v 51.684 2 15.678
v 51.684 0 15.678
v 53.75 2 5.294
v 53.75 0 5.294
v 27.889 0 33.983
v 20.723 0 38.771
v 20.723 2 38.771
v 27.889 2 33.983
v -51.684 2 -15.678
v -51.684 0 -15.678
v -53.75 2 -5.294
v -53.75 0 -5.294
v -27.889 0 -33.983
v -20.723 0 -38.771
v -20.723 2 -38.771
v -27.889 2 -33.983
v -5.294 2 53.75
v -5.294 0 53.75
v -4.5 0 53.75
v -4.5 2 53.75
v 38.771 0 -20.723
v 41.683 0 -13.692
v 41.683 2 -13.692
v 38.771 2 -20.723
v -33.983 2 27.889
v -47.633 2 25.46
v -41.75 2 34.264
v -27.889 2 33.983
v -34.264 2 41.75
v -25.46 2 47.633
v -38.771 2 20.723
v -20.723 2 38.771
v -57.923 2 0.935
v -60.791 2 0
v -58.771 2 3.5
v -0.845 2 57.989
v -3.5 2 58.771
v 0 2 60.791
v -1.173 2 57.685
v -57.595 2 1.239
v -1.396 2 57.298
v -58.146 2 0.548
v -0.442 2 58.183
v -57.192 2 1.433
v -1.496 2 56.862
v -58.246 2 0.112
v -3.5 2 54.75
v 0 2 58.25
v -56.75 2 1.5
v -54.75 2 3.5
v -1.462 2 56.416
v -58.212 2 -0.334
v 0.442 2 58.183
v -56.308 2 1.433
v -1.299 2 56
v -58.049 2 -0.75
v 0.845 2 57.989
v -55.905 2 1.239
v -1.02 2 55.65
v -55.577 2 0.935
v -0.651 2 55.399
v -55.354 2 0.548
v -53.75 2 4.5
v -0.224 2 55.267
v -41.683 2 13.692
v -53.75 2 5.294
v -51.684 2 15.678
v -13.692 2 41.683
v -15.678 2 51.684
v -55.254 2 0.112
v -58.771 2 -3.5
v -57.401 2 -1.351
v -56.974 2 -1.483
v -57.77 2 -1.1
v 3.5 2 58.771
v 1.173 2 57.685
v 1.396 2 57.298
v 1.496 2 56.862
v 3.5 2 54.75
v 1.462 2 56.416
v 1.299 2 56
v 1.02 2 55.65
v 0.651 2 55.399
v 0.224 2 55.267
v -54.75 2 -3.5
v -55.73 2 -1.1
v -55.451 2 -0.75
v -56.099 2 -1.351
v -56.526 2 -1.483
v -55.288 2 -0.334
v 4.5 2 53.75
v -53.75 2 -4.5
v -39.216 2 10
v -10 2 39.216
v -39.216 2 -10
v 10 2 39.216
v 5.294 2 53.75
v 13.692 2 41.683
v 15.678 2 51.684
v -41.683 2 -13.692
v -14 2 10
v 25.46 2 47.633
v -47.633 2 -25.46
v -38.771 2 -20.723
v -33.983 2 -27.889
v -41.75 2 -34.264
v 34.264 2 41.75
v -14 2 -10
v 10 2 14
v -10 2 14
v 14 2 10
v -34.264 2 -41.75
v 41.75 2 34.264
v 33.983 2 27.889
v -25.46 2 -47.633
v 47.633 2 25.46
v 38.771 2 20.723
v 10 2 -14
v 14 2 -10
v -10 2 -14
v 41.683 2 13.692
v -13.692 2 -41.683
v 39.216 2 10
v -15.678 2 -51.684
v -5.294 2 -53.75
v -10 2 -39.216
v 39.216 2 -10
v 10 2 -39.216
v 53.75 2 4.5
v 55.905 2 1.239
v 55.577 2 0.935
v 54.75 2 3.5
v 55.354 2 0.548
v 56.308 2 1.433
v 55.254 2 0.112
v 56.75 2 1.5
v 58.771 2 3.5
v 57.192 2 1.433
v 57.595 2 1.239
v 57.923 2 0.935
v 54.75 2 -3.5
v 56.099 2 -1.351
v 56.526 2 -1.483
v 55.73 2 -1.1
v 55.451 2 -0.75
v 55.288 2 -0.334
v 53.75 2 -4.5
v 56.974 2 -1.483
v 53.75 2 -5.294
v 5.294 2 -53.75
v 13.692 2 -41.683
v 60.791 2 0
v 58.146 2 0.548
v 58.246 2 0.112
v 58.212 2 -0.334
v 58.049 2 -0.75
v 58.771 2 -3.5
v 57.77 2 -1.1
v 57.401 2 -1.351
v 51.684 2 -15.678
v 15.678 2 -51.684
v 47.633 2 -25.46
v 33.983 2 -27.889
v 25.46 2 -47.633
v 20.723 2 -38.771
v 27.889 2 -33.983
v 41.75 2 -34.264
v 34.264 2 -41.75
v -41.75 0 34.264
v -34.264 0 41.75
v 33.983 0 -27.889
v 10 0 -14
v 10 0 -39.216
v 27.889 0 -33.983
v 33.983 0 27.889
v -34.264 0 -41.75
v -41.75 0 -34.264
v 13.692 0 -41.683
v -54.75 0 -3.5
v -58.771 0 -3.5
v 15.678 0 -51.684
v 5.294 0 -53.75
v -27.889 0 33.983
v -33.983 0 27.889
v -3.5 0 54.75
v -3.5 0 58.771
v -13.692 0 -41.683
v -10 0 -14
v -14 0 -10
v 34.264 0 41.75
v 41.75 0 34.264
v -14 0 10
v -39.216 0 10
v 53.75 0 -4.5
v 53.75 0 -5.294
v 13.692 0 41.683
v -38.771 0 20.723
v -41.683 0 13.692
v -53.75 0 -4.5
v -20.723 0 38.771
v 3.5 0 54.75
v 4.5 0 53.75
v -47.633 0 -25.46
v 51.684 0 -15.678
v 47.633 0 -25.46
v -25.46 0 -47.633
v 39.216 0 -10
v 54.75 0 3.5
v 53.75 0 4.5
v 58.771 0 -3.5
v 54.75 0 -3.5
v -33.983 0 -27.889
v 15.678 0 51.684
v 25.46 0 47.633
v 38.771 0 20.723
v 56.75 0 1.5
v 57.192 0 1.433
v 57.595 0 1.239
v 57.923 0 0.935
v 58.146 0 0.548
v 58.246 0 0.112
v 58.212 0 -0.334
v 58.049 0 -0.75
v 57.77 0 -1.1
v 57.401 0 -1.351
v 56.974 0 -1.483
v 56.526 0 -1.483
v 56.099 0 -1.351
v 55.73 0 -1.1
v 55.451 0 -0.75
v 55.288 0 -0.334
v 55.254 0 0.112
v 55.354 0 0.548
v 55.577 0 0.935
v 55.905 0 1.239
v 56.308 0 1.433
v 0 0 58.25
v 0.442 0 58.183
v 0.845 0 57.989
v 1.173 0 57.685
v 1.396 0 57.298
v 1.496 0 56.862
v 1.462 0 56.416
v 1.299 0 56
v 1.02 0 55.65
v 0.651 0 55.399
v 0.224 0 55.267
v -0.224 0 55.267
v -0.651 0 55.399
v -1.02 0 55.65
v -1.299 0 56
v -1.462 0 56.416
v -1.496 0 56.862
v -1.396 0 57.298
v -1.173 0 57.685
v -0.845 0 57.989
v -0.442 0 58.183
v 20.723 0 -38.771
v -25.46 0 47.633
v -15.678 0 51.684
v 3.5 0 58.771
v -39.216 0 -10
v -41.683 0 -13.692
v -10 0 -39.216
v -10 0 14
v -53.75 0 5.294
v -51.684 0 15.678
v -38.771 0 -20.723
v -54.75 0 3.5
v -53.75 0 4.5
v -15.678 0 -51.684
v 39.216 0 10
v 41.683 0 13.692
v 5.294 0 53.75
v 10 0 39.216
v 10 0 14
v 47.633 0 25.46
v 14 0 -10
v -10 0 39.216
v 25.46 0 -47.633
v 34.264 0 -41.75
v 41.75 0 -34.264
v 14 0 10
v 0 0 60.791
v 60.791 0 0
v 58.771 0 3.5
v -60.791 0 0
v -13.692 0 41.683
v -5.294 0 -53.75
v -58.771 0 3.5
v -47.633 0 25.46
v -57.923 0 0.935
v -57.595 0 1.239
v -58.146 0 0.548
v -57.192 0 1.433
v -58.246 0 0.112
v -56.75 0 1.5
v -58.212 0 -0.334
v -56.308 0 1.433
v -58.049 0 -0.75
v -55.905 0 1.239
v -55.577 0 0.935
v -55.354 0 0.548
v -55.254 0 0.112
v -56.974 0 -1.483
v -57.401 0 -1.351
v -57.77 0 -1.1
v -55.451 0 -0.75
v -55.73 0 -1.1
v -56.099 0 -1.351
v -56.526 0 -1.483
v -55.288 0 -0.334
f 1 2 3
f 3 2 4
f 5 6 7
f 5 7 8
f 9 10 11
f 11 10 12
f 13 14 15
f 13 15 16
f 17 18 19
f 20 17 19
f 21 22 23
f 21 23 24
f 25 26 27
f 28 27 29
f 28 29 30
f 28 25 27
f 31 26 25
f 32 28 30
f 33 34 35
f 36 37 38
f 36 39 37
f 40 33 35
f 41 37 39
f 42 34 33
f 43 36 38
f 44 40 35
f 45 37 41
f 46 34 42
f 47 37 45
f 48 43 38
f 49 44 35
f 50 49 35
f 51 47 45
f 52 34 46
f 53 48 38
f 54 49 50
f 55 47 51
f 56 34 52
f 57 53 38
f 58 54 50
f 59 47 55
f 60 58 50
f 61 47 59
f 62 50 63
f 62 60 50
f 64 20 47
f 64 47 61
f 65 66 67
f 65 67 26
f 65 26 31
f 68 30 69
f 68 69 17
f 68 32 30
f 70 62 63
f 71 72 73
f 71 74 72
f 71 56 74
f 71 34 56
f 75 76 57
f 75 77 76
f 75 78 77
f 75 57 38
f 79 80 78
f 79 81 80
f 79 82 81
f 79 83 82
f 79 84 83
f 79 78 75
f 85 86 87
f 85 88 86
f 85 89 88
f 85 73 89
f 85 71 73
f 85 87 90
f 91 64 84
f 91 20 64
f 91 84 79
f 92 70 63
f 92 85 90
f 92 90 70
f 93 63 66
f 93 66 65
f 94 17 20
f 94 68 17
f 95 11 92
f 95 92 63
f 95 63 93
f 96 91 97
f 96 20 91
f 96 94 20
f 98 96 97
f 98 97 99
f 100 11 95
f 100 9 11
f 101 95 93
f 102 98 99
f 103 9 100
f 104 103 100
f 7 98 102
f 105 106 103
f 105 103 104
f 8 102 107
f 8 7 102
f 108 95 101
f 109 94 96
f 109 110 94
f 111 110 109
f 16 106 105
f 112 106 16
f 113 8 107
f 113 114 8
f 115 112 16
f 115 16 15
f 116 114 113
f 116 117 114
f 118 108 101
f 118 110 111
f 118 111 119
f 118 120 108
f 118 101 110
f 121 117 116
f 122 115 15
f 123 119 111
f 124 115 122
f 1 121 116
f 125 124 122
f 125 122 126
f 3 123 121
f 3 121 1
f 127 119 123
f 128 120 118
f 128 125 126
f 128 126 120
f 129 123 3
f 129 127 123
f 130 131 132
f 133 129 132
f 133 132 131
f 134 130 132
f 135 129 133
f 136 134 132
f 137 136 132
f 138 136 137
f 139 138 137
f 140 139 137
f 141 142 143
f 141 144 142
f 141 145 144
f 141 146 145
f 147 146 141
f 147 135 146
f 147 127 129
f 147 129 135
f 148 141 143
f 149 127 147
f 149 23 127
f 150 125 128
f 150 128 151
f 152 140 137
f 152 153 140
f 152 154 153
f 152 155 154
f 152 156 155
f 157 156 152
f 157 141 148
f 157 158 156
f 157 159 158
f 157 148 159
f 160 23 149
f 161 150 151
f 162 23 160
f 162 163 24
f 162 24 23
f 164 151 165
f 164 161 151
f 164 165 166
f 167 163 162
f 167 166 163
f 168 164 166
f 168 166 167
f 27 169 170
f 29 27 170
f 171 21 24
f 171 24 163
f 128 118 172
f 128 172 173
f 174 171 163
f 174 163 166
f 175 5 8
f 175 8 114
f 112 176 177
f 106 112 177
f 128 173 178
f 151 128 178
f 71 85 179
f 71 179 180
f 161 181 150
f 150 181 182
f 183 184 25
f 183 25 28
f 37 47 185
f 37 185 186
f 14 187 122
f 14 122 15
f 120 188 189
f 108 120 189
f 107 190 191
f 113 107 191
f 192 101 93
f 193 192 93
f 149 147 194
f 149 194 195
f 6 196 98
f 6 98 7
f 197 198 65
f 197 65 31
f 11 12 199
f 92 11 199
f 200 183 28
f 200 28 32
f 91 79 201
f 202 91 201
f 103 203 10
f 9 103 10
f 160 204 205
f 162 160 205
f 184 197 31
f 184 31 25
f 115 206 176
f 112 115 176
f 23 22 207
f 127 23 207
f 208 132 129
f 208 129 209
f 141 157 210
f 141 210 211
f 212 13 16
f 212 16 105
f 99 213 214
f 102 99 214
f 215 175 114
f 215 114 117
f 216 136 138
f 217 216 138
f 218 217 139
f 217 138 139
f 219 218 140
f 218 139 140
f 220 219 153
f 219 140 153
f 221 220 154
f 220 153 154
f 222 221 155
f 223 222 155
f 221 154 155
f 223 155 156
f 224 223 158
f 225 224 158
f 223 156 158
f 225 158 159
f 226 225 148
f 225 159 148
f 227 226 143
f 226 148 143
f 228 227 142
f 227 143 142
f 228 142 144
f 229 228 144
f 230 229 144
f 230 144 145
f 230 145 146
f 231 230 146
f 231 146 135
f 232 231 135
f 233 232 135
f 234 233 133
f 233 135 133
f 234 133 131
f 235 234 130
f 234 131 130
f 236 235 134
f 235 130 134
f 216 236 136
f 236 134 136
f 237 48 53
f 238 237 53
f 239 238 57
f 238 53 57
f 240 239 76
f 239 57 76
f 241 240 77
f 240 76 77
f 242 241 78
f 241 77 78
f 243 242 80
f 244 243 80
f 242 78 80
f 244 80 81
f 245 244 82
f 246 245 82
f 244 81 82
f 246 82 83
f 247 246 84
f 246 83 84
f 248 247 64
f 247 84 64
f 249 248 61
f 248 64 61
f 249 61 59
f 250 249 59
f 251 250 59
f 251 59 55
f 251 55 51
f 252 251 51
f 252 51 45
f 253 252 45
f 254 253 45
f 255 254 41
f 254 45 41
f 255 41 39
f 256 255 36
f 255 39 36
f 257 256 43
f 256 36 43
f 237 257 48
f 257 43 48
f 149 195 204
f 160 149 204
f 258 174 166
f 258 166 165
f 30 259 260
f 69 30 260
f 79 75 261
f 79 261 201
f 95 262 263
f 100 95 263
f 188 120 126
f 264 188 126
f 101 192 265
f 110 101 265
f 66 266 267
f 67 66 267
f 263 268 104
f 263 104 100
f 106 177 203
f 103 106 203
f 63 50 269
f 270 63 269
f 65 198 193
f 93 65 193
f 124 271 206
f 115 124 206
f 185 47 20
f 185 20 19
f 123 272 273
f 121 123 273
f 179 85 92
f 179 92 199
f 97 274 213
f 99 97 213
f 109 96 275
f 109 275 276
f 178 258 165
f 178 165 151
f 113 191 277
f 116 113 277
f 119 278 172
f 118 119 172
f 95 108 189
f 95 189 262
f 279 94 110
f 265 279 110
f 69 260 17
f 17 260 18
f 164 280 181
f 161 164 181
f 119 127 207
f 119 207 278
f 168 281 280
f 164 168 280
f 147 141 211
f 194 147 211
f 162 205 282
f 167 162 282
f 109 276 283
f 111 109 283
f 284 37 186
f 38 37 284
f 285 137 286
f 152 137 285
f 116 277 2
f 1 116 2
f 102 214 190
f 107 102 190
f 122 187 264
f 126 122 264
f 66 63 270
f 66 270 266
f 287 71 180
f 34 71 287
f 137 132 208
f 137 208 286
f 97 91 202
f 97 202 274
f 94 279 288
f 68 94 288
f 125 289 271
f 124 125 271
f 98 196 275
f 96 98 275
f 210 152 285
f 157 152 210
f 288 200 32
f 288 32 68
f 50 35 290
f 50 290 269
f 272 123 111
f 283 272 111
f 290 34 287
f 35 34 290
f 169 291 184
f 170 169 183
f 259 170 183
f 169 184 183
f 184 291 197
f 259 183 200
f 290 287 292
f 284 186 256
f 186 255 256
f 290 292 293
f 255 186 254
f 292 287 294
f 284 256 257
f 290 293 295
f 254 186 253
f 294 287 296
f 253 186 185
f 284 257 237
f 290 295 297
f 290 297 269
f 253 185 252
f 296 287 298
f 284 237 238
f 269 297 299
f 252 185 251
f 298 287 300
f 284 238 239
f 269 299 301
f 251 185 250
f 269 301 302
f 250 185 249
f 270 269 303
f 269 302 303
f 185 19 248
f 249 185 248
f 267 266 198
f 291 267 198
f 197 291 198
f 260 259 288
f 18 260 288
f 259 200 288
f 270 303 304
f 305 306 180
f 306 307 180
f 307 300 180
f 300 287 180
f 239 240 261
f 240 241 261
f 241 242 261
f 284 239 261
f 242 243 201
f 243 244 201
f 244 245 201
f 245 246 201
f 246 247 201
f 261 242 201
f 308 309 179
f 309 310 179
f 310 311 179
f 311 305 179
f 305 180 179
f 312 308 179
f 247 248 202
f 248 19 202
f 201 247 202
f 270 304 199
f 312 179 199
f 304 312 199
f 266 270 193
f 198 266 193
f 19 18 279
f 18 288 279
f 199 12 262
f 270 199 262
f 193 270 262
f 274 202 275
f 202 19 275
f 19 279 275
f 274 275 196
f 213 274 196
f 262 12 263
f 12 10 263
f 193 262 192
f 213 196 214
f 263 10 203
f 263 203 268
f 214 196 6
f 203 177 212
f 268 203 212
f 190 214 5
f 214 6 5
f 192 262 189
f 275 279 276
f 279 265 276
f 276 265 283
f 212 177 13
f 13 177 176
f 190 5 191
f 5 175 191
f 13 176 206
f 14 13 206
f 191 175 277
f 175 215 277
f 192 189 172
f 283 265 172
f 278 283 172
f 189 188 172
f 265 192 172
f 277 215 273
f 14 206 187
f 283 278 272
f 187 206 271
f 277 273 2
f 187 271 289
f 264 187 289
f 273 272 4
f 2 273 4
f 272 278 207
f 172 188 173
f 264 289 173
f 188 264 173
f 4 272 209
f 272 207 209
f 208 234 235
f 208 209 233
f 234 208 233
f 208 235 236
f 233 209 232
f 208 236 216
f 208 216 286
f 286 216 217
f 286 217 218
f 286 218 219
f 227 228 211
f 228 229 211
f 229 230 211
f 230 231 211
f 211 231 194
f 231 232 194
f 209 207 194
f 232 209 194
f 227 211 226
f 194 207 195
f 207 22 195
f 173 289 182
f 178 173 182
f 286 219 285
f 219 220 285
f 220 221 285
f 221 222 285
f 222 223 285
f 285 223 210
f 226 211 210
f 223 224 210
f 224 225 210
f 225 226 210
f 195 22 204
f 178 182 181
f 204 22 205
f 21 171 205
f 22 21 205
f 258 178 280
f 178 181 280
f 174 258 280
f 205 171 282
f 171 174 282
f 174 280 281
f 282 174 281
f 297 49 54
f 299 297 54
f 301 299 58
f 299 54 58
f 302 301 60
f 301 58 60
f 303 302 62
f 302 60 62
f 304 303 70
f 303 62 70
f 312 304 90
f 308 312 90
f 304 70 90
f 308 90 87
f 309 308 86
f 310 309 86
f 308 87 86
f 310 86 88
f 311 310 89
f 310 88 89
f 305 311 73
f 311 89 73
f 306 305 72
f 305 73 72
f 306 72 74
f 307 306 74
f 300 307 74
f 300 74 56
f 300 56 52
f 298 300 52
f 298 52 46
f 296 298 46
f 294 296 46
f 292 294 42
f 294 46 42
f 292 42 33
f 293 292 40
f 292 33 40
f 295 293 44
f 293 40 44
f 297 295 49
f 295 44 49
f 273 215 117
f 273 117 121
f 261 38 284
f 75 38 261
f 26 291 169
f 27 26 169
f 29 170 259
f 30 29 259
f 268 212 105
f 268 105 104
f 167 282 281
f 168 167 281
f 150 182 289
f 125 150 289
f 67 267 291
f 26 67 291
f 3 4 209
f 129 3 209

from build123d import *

# Parameters (mm, degrees)
BOSS_EXTRUDE1_DEPTH = 2
SKETCH3_W           = 20
SKETCH3_H           = 87.5
BOSS_EXTRUDE4_DEPTH = 2
CIRPATTERN1_COUNT   = 2
CIRPATTERN1_ANGLE   = 90
CHAMFER1_DEPTH      = 2
SKETCH5_R           = 1.5
BOSS_EXTRUDE6_DEPTH = 2
CHAMFER3_SIZE       = 1


with BuildPart() as part:
    # Sketch1 → Boss-Extrude1 (new body)
    with BuildSketch(Plane(origin=(0, 0, 0), x_dir=(1, 0, 0), z_dir=(0, 1, 0))):
        Polygon((53.75, 5.29391293), (51.684417643, 15.678296686), (47.632632102, 25.460172293), (41.750351221, 34.263627757), (34.263627757, 41.750351221), (25.460172293, 47.632632102), (15.678296686, 51.684417643), (5.29391293, 53.75), (-5.29391293, 53.75), (-15.678296686, 51.684417643), (-25.460172293, 47.632632102), (-34.263627757, 41.750351221), (-41.750351221, 34.263627757), (-47.632632102, 25.460172293), (-51.684417643, 15.678296686), (-53.75, 5.29391293), (-53.75, -5.29391293), (-51.684417643, -15.678296686), (-47.632632102, -25.460172293), (-41.750351221, -34.263627757), (-34.263627757, -41.750351221), (-25.460172293, -47.632632102), (-15.678296686, -51.684417643), (-5.29391293, -53.75), (5.29391293, -53.75), (15.678296686, -51.684417643), (25.460172293, -47.632632102), (34.263627757, -41.750351221), (41.750351221, -34.263627757), (47.632632102, -25.460172293), (51.684417643, -15.678296686), (53.75, -5.29391293), align=None)
        Polygon((43.75, 4.308998897), (42.068712035, 12.76140428), (38.770747059, 20.723396052), (33.982844017, 27.888999337), (27.888999337, 33.982844017), (20.723396052, 38.770747059), (12.76140428, 42.068712035), (4.308998897, 43.75), (-4.308998897, 43.75), (-12.76140428, 42.068712035), (-20.723396052, 38.770747059), (-27.888999337, 33.982844017), (-33.982844017, 27.888999337), (-38.770747059, 20.723396052), (-42.068712035, 12.76140428), (-43.75, 4.308998897), (-43.75, -4.308998897), (-42.068712035, -12.76140428), (-38.770747059, -20.723396052), (-33.982844017, -27.888999337), (-27.888999337, -33.982844017), (-20.723396052, -38.770747059), (-12.76140428, -42.068712035), (-4.308998897, -43.75), (4.308998897, -43.75), (12.76140428, -42.068712035), (20.723396052, -38.770747059), (27.888999337, -33.982844017), (33.982844017, -27.888999337), (38.770747059, -20.723396052), (42.068712035, -12.76140428), (43.75, -4.308998897), align=None, mode=Mode.SUBTRACT)
    extrude(amount=BOSS_EXTRUDE1_DEPTH)

    # Sketch3 → Boss-Extrude4 (add)
    with BuildSketch(Plane(origin=(0, 2, 0), x_dir=(1, 0, 0), z_dir=(0, 1, 0))):
        Rectangle(SKETCH3_W, SKETCH3_H)
    boss_extrude4 = extrude(amount=-BOSS_EXTRUDE4_DEPTH)

    # CirPattern1: Boss-Extrude4 ×2 about axis
    cirpattern1_axis = Axis((0, 2, 0), (0, 1, 0))
    for i in range(1, CIRPATTERN1_COUNT):
        add(boss_extrude4.rotate(cirpattern1_axis, i * CIRPATTERN1_ANGLE / (CIRPATTERN1_COUNT - 1)))

    # Chamfer1: read off the stored shape, not the designer's step
    # Chamfer1 outline → Chamfer1 (add)
    with BuildSketch(Plane(origin=(0, 0, 0), x_dir=(1, 0, 0), z_dir=(0, 1, 0))):
        Polygon((10, -10), (10, -14), (14, -10), align=None)
        Polygon((13.692057296, -41.683222934), (10, -39.216269119), (10, -42.617989498), (12.76140428, -42.068712035), align=None)
        Polygon((42.617989498, -10), (39.216269119, -10), (41.683222934, -13.692057296), (42.068712035, -12.76140428), align=None)
        Polygon((-10, 10), (-10, 14), (-14, 10), align=None)
        Polygon((-13.692057296, 41.683222934), (-10, 39.216269119), (-10, 42.617989498), (-12.76140428, 42.068712035), align=None)
        Polygon((-42.617989498, 10), (-39.216269119, 10), (-41.683222934, 13.692057296), (-42.068712035, 12.76140428), align=None)
        Polygon((10, 10), (14, 10), (10, 14), align=None)
        Polygon((41.683222934, 13.692057296), (39.216269119, 10), (42.617989498, 10), (42.068712035, 12.76140428), align=None)
        Polygon((10, 42.617989498), (10, 39.216269119), (13.692057296, 41.683222934), (12.76140428, 42.068712035), align=None)
        Polygon((-10, -10), (-14, -10), (-10, -14), align=None)
        Polygon((-41.683222934, -13.692057296), (-39.216269119, -10), (-42.617989498, -10), (-42.068712035, -12.76140428), align=None)
        Polygon((-10, -42.617989498), (-10, -39.216269119), (-13.692057296, -41.683222934), (-12.76140428, -42.068712035), align=None)
    extrude(amount=CHAMFER1_DEPTH)

    # Sketch5 → Boss-Extrude6 (add)
    # profile 1 of 3: a face of its own
    with BuildSketch(Plane(origin=(0, 2, 0), x_dir=(1, 0, 0), z_dir=(0, 1, 0))):
        Polygon((-54.729274058, 3.5), (-58.770725942, 3.5), (-60.791451884, 0), (-58.770725942, -3.5), (-54.729274058, -3.5), (-53.75, -3.5), (-53.75, 3.5), align=None)
        with Locations(Location((-56.75, 0, 0), (0, 0, 270))):
            Circle(SKETCH5_R, mode=Mode.SUBTRACT)
    # profile 2 of 3: a face of its own
    with BuildSketch(Plane(origin=(0, 2, 0), x_dir=(1, 0, 0), z_dir=(0, 1, 0))):
        Polygon((54.729274058, 3.5), (53.75, 3.5), (53.75, -3.5), (54.729274058, -3.5), (58.770725942, -3.5), (60.791451884, 0), (58.770725942, 3.5), align=None)
        with Locations(Location((56.75, 0, 0), (0, 0, 270))):
            Circle(SKETCH5_R, mode=Mode.SUBTRACT)
    # profile 3 of 3: a face of its own
    with BuildSketch(Plane(origin=(0, 2, 0), x_dir=(1, 0, 0), z_dir=(0, 1, 0))):
        Polygon((3.5, -54.729274058), (3.5, -53.75), (-3.5, -53.75), (-3.5, -54.729274058), (-3.5, -58.770725942), (0, -60.791451884), (3.5, -58.770725942), align=None)
        with Locations(Location((0, -56.75, 0), (0, 0, 270))):
            Circle(SKETCH5_R, mode=Mode.SUBTRACT)
    extrude(amount=-BOSS_EXTRUDE6_DEPTH)

    # Chamfer3
    chamfer3_edges = [part.edges().sort_by_distance(p)[0] for p in [
        (-53.75, 1, 3.5),
        (-53.75, 1, -3.5),
        (53.75, 1, -3.5),
        (53.75, 1, 3.5),
        (3.5, 1, 53.75),
        (-3.5, 1, 53.75),
    ]]
    chamfer(chamfer3_edges, length=CHAMFER3_SIZE)


solid = part.part
